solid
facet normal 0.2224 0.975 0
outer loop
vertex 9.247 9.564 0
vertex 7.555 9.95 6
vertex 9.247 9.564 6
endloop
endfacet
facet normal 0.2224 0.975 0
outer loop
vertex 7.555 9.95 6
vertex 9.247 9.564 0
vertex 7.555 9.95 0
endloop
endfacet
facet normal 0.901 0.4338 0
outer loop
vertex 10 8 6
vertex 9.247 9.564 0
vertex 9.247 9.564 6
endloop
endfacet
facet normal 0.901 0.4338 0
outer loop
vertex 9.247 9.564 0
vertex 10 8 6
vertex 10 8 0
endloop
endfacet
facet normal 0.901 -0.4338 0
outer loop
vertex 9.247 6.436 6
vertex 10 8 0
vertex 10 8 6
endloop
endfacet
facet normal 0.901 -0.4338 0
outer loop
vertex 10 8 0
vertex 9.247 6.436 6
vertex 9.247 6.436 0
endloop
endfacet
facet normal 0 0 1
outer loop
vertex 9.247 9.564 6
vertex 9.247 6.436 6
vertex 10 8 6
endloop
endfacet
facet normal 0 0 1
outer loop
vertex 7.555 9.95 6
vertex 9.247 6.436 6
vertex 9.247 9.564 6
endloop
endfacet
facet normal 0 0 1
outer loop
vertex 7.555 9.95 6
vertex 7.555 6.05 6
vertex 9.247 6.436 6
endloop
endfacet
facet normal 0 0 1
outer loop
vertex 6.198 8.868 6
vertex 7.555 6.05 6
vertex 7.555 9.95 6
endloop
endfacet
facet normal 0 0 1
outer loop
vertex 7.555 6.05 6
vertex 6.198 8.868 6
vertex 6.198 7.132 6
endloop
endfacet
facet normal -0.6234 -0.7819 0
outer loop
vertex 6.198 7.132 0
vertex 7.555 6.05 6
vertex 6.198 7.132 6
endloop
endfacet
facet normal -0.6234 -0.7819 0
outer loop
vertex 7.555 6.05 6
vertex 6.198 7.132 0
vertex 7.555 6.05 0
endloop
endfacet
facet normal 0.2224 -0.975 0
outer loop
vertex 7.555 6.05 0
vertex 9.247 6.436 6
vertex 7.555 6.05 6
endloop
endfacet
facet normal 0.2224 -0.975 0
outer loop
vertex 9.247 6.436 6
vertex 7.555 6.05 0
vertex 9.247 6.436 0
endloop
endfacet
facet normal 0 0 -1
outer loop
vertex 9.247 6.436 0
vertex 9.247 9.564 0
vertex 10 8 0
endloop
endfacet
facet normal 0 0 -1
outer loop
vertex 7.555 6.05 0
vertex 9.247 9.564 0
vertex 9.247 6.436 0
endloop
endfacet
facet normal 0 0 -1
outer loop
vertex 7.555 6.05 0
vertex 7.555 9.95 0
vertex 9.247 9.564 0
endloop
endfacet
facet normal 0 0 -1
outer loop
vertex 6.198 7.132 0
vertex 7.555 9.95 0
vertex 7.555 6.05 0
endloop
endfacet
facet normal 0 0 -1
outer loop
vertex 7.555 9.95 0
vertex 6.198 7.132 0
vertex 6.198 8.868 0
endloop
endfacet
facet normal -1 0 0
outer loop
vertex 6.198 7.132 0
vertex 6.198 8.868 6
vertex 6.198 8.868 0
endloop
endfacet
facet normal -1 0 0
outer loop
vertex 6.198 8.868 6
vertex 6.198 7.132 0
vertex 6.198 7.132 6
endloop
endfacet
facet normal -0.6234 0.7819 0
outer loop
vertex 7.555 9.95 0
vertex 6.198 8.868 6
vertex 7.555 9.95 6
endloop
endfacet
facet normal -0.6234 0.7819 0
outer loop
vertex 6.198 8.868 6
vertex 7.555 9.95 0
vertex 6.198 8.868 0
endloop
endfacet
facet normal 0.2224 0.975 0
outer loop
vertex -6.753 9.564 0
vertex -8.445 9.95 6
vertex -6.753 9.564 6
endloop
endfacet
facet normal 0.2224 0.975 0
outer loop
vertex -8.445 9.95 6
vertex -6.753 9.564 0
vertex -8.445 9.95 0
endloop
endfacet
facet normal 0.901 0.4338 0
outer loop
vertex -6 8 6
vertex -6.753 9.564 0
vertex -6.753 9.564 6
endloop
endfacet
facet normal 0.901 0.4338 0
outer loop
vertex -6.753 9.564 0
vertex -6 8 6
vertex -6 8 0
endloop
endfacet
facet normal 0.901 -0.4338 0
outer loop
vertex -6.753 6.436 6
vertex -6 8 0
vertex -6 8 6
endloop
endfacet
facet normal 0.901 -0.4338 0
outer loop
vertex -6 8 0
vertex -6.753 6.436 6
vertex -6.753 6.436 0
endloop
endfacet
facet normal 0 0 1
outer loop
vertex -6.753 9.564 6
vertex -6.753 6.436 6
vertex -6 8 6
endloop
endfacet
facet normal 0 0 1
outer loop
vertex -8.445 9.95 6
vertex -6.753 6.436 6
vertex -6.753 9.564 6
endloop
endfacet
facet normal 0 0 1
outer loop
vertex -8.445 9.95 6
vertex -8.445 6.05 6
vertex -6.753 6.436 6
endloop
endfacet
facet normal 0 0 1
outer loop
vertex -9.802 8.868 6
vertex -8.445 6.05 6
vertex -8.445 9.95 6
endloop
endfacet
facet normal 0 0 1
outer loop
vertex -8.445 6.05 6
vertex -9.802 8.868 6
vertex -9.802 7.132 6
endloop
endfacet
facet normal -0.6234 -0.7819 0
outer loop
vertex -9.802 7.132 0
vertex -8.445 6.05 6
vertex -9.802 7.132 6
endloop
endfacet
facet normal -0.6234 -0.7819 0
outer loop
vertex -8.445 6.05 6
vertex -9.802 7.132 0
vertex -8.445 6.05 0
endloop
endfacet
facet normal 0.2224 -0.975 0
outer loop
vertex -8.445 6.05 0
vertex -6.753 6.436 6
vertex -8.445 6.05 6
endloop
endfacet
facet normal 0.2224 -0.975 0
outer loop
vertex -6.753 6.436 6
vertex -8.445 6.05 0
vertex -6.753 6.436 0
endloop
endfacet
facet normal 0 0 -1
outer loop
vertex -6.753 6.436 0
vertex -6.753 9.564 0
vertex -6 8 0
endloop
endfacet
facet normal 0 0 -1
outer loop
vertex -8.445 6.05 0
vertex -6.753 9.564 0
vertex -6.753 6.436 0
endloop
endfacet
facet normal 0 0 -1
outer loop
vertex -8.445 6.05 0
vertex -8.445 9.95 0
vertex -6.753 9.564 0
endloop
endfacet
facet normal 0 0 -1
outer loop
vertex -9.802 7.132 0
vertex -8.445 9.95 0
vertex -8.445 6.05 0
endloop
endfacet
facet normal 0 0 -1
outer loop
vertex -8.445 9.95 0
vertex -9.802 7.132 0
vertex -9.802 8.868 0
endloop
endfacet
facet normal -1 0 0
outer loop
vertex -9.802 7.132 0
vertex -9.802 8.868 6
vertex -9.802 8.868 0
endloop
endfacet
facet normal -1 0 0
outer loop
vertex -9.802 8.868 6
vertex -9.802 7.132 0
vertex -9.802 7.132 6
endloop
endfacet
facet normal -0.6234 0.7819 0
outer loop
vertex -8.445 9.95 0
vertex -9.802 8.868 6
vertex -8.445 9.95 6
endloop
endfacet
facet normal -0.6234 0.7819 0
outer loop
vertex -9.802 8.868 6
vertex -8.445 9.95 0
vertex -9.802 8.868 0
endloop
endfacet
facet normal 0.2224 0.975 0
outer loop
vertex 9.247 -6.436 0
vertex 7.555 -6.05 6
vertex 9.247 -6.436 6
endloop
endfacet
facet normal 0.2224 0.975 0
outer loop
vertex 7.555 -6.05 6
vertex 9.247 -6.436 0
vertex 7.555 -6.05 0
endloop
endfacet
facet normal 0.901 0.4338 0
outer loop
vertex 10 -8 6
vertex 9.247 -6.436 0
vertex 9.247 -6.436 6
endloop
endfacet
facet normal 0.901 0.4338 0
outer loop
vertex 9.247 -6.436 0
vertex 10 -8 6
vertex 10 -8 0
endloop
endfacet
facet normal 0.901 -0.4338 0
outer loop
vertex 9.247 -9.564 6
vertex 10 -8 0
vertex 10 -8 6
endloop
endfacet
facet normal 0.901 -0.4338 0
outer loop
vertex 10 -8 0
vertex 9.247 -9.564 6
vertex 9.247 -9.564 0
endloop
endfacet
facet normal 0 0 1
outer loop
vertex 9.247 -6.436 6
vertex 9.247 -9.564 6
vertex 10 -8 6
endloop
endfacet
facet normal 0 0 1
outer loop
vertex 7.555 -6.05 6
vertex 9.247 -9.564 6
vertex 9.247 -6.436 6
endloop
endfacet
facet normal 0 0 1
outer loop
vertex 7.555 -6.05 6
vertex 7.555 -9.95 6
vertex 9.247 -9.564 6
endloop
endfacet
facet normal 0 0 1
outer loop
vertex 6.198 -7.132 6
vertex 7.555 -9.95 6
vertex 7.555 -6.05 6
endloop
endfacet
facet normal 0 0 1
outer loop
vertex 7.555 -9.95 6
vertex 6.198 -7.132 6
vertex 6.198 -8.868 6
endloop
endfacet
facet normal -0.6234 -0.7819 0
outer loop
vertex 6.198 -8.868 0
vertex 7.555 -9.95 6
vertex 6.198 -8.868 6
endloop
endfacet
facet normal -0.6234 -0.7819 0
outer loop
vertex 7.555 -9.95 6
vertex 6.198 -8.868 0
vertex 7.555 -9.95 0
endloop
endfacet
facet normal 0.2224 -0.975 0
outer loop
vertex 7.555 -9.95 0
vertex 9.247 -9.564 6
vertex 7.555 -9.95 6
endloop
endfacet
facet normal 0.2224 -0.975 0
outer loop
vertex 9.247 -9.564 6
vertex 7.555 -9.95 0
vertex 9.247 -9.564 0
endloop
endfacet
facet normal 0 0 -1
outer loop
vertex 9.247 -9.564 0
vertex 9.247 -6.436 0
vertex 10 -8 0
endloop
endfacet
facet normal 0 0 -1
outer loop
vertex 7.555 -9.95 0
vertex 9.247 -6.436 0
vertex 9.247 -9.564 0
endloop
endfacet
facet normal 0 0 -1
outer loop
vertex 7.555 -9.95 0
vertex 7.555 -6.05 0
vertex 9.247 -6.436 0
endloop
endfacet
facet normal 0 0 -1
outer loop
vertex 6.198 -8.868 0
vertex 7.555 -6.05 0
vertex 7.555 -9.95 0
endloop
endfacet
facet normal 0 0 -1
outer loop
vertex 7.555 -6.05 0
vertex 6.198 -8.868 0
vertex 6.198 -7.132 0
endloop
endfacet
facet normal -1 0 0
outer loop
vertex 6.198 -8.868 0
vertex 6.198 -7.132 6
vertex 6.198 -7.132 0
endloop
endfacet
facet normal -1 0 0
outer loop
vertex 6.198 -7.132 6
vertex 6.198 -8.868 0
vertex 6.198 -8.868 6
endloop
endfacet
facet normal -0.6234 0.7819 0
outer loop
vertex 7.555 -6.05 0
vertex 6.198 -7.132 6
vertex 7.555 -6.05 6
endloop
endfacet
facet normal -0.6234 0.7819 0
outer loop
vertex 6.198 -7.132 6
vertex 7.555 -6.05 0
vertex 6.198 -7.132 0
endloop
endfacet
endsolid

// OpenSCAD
union() {
  translate([8, 8, 0]) cylinder(r=2, h=6, center=false);
  translate([-8, 8, 0]) cylinder(r=2, h=6, center=false);
  translate([8, -8, 0]) cylinder(r=2, h=6, center=false);
}
